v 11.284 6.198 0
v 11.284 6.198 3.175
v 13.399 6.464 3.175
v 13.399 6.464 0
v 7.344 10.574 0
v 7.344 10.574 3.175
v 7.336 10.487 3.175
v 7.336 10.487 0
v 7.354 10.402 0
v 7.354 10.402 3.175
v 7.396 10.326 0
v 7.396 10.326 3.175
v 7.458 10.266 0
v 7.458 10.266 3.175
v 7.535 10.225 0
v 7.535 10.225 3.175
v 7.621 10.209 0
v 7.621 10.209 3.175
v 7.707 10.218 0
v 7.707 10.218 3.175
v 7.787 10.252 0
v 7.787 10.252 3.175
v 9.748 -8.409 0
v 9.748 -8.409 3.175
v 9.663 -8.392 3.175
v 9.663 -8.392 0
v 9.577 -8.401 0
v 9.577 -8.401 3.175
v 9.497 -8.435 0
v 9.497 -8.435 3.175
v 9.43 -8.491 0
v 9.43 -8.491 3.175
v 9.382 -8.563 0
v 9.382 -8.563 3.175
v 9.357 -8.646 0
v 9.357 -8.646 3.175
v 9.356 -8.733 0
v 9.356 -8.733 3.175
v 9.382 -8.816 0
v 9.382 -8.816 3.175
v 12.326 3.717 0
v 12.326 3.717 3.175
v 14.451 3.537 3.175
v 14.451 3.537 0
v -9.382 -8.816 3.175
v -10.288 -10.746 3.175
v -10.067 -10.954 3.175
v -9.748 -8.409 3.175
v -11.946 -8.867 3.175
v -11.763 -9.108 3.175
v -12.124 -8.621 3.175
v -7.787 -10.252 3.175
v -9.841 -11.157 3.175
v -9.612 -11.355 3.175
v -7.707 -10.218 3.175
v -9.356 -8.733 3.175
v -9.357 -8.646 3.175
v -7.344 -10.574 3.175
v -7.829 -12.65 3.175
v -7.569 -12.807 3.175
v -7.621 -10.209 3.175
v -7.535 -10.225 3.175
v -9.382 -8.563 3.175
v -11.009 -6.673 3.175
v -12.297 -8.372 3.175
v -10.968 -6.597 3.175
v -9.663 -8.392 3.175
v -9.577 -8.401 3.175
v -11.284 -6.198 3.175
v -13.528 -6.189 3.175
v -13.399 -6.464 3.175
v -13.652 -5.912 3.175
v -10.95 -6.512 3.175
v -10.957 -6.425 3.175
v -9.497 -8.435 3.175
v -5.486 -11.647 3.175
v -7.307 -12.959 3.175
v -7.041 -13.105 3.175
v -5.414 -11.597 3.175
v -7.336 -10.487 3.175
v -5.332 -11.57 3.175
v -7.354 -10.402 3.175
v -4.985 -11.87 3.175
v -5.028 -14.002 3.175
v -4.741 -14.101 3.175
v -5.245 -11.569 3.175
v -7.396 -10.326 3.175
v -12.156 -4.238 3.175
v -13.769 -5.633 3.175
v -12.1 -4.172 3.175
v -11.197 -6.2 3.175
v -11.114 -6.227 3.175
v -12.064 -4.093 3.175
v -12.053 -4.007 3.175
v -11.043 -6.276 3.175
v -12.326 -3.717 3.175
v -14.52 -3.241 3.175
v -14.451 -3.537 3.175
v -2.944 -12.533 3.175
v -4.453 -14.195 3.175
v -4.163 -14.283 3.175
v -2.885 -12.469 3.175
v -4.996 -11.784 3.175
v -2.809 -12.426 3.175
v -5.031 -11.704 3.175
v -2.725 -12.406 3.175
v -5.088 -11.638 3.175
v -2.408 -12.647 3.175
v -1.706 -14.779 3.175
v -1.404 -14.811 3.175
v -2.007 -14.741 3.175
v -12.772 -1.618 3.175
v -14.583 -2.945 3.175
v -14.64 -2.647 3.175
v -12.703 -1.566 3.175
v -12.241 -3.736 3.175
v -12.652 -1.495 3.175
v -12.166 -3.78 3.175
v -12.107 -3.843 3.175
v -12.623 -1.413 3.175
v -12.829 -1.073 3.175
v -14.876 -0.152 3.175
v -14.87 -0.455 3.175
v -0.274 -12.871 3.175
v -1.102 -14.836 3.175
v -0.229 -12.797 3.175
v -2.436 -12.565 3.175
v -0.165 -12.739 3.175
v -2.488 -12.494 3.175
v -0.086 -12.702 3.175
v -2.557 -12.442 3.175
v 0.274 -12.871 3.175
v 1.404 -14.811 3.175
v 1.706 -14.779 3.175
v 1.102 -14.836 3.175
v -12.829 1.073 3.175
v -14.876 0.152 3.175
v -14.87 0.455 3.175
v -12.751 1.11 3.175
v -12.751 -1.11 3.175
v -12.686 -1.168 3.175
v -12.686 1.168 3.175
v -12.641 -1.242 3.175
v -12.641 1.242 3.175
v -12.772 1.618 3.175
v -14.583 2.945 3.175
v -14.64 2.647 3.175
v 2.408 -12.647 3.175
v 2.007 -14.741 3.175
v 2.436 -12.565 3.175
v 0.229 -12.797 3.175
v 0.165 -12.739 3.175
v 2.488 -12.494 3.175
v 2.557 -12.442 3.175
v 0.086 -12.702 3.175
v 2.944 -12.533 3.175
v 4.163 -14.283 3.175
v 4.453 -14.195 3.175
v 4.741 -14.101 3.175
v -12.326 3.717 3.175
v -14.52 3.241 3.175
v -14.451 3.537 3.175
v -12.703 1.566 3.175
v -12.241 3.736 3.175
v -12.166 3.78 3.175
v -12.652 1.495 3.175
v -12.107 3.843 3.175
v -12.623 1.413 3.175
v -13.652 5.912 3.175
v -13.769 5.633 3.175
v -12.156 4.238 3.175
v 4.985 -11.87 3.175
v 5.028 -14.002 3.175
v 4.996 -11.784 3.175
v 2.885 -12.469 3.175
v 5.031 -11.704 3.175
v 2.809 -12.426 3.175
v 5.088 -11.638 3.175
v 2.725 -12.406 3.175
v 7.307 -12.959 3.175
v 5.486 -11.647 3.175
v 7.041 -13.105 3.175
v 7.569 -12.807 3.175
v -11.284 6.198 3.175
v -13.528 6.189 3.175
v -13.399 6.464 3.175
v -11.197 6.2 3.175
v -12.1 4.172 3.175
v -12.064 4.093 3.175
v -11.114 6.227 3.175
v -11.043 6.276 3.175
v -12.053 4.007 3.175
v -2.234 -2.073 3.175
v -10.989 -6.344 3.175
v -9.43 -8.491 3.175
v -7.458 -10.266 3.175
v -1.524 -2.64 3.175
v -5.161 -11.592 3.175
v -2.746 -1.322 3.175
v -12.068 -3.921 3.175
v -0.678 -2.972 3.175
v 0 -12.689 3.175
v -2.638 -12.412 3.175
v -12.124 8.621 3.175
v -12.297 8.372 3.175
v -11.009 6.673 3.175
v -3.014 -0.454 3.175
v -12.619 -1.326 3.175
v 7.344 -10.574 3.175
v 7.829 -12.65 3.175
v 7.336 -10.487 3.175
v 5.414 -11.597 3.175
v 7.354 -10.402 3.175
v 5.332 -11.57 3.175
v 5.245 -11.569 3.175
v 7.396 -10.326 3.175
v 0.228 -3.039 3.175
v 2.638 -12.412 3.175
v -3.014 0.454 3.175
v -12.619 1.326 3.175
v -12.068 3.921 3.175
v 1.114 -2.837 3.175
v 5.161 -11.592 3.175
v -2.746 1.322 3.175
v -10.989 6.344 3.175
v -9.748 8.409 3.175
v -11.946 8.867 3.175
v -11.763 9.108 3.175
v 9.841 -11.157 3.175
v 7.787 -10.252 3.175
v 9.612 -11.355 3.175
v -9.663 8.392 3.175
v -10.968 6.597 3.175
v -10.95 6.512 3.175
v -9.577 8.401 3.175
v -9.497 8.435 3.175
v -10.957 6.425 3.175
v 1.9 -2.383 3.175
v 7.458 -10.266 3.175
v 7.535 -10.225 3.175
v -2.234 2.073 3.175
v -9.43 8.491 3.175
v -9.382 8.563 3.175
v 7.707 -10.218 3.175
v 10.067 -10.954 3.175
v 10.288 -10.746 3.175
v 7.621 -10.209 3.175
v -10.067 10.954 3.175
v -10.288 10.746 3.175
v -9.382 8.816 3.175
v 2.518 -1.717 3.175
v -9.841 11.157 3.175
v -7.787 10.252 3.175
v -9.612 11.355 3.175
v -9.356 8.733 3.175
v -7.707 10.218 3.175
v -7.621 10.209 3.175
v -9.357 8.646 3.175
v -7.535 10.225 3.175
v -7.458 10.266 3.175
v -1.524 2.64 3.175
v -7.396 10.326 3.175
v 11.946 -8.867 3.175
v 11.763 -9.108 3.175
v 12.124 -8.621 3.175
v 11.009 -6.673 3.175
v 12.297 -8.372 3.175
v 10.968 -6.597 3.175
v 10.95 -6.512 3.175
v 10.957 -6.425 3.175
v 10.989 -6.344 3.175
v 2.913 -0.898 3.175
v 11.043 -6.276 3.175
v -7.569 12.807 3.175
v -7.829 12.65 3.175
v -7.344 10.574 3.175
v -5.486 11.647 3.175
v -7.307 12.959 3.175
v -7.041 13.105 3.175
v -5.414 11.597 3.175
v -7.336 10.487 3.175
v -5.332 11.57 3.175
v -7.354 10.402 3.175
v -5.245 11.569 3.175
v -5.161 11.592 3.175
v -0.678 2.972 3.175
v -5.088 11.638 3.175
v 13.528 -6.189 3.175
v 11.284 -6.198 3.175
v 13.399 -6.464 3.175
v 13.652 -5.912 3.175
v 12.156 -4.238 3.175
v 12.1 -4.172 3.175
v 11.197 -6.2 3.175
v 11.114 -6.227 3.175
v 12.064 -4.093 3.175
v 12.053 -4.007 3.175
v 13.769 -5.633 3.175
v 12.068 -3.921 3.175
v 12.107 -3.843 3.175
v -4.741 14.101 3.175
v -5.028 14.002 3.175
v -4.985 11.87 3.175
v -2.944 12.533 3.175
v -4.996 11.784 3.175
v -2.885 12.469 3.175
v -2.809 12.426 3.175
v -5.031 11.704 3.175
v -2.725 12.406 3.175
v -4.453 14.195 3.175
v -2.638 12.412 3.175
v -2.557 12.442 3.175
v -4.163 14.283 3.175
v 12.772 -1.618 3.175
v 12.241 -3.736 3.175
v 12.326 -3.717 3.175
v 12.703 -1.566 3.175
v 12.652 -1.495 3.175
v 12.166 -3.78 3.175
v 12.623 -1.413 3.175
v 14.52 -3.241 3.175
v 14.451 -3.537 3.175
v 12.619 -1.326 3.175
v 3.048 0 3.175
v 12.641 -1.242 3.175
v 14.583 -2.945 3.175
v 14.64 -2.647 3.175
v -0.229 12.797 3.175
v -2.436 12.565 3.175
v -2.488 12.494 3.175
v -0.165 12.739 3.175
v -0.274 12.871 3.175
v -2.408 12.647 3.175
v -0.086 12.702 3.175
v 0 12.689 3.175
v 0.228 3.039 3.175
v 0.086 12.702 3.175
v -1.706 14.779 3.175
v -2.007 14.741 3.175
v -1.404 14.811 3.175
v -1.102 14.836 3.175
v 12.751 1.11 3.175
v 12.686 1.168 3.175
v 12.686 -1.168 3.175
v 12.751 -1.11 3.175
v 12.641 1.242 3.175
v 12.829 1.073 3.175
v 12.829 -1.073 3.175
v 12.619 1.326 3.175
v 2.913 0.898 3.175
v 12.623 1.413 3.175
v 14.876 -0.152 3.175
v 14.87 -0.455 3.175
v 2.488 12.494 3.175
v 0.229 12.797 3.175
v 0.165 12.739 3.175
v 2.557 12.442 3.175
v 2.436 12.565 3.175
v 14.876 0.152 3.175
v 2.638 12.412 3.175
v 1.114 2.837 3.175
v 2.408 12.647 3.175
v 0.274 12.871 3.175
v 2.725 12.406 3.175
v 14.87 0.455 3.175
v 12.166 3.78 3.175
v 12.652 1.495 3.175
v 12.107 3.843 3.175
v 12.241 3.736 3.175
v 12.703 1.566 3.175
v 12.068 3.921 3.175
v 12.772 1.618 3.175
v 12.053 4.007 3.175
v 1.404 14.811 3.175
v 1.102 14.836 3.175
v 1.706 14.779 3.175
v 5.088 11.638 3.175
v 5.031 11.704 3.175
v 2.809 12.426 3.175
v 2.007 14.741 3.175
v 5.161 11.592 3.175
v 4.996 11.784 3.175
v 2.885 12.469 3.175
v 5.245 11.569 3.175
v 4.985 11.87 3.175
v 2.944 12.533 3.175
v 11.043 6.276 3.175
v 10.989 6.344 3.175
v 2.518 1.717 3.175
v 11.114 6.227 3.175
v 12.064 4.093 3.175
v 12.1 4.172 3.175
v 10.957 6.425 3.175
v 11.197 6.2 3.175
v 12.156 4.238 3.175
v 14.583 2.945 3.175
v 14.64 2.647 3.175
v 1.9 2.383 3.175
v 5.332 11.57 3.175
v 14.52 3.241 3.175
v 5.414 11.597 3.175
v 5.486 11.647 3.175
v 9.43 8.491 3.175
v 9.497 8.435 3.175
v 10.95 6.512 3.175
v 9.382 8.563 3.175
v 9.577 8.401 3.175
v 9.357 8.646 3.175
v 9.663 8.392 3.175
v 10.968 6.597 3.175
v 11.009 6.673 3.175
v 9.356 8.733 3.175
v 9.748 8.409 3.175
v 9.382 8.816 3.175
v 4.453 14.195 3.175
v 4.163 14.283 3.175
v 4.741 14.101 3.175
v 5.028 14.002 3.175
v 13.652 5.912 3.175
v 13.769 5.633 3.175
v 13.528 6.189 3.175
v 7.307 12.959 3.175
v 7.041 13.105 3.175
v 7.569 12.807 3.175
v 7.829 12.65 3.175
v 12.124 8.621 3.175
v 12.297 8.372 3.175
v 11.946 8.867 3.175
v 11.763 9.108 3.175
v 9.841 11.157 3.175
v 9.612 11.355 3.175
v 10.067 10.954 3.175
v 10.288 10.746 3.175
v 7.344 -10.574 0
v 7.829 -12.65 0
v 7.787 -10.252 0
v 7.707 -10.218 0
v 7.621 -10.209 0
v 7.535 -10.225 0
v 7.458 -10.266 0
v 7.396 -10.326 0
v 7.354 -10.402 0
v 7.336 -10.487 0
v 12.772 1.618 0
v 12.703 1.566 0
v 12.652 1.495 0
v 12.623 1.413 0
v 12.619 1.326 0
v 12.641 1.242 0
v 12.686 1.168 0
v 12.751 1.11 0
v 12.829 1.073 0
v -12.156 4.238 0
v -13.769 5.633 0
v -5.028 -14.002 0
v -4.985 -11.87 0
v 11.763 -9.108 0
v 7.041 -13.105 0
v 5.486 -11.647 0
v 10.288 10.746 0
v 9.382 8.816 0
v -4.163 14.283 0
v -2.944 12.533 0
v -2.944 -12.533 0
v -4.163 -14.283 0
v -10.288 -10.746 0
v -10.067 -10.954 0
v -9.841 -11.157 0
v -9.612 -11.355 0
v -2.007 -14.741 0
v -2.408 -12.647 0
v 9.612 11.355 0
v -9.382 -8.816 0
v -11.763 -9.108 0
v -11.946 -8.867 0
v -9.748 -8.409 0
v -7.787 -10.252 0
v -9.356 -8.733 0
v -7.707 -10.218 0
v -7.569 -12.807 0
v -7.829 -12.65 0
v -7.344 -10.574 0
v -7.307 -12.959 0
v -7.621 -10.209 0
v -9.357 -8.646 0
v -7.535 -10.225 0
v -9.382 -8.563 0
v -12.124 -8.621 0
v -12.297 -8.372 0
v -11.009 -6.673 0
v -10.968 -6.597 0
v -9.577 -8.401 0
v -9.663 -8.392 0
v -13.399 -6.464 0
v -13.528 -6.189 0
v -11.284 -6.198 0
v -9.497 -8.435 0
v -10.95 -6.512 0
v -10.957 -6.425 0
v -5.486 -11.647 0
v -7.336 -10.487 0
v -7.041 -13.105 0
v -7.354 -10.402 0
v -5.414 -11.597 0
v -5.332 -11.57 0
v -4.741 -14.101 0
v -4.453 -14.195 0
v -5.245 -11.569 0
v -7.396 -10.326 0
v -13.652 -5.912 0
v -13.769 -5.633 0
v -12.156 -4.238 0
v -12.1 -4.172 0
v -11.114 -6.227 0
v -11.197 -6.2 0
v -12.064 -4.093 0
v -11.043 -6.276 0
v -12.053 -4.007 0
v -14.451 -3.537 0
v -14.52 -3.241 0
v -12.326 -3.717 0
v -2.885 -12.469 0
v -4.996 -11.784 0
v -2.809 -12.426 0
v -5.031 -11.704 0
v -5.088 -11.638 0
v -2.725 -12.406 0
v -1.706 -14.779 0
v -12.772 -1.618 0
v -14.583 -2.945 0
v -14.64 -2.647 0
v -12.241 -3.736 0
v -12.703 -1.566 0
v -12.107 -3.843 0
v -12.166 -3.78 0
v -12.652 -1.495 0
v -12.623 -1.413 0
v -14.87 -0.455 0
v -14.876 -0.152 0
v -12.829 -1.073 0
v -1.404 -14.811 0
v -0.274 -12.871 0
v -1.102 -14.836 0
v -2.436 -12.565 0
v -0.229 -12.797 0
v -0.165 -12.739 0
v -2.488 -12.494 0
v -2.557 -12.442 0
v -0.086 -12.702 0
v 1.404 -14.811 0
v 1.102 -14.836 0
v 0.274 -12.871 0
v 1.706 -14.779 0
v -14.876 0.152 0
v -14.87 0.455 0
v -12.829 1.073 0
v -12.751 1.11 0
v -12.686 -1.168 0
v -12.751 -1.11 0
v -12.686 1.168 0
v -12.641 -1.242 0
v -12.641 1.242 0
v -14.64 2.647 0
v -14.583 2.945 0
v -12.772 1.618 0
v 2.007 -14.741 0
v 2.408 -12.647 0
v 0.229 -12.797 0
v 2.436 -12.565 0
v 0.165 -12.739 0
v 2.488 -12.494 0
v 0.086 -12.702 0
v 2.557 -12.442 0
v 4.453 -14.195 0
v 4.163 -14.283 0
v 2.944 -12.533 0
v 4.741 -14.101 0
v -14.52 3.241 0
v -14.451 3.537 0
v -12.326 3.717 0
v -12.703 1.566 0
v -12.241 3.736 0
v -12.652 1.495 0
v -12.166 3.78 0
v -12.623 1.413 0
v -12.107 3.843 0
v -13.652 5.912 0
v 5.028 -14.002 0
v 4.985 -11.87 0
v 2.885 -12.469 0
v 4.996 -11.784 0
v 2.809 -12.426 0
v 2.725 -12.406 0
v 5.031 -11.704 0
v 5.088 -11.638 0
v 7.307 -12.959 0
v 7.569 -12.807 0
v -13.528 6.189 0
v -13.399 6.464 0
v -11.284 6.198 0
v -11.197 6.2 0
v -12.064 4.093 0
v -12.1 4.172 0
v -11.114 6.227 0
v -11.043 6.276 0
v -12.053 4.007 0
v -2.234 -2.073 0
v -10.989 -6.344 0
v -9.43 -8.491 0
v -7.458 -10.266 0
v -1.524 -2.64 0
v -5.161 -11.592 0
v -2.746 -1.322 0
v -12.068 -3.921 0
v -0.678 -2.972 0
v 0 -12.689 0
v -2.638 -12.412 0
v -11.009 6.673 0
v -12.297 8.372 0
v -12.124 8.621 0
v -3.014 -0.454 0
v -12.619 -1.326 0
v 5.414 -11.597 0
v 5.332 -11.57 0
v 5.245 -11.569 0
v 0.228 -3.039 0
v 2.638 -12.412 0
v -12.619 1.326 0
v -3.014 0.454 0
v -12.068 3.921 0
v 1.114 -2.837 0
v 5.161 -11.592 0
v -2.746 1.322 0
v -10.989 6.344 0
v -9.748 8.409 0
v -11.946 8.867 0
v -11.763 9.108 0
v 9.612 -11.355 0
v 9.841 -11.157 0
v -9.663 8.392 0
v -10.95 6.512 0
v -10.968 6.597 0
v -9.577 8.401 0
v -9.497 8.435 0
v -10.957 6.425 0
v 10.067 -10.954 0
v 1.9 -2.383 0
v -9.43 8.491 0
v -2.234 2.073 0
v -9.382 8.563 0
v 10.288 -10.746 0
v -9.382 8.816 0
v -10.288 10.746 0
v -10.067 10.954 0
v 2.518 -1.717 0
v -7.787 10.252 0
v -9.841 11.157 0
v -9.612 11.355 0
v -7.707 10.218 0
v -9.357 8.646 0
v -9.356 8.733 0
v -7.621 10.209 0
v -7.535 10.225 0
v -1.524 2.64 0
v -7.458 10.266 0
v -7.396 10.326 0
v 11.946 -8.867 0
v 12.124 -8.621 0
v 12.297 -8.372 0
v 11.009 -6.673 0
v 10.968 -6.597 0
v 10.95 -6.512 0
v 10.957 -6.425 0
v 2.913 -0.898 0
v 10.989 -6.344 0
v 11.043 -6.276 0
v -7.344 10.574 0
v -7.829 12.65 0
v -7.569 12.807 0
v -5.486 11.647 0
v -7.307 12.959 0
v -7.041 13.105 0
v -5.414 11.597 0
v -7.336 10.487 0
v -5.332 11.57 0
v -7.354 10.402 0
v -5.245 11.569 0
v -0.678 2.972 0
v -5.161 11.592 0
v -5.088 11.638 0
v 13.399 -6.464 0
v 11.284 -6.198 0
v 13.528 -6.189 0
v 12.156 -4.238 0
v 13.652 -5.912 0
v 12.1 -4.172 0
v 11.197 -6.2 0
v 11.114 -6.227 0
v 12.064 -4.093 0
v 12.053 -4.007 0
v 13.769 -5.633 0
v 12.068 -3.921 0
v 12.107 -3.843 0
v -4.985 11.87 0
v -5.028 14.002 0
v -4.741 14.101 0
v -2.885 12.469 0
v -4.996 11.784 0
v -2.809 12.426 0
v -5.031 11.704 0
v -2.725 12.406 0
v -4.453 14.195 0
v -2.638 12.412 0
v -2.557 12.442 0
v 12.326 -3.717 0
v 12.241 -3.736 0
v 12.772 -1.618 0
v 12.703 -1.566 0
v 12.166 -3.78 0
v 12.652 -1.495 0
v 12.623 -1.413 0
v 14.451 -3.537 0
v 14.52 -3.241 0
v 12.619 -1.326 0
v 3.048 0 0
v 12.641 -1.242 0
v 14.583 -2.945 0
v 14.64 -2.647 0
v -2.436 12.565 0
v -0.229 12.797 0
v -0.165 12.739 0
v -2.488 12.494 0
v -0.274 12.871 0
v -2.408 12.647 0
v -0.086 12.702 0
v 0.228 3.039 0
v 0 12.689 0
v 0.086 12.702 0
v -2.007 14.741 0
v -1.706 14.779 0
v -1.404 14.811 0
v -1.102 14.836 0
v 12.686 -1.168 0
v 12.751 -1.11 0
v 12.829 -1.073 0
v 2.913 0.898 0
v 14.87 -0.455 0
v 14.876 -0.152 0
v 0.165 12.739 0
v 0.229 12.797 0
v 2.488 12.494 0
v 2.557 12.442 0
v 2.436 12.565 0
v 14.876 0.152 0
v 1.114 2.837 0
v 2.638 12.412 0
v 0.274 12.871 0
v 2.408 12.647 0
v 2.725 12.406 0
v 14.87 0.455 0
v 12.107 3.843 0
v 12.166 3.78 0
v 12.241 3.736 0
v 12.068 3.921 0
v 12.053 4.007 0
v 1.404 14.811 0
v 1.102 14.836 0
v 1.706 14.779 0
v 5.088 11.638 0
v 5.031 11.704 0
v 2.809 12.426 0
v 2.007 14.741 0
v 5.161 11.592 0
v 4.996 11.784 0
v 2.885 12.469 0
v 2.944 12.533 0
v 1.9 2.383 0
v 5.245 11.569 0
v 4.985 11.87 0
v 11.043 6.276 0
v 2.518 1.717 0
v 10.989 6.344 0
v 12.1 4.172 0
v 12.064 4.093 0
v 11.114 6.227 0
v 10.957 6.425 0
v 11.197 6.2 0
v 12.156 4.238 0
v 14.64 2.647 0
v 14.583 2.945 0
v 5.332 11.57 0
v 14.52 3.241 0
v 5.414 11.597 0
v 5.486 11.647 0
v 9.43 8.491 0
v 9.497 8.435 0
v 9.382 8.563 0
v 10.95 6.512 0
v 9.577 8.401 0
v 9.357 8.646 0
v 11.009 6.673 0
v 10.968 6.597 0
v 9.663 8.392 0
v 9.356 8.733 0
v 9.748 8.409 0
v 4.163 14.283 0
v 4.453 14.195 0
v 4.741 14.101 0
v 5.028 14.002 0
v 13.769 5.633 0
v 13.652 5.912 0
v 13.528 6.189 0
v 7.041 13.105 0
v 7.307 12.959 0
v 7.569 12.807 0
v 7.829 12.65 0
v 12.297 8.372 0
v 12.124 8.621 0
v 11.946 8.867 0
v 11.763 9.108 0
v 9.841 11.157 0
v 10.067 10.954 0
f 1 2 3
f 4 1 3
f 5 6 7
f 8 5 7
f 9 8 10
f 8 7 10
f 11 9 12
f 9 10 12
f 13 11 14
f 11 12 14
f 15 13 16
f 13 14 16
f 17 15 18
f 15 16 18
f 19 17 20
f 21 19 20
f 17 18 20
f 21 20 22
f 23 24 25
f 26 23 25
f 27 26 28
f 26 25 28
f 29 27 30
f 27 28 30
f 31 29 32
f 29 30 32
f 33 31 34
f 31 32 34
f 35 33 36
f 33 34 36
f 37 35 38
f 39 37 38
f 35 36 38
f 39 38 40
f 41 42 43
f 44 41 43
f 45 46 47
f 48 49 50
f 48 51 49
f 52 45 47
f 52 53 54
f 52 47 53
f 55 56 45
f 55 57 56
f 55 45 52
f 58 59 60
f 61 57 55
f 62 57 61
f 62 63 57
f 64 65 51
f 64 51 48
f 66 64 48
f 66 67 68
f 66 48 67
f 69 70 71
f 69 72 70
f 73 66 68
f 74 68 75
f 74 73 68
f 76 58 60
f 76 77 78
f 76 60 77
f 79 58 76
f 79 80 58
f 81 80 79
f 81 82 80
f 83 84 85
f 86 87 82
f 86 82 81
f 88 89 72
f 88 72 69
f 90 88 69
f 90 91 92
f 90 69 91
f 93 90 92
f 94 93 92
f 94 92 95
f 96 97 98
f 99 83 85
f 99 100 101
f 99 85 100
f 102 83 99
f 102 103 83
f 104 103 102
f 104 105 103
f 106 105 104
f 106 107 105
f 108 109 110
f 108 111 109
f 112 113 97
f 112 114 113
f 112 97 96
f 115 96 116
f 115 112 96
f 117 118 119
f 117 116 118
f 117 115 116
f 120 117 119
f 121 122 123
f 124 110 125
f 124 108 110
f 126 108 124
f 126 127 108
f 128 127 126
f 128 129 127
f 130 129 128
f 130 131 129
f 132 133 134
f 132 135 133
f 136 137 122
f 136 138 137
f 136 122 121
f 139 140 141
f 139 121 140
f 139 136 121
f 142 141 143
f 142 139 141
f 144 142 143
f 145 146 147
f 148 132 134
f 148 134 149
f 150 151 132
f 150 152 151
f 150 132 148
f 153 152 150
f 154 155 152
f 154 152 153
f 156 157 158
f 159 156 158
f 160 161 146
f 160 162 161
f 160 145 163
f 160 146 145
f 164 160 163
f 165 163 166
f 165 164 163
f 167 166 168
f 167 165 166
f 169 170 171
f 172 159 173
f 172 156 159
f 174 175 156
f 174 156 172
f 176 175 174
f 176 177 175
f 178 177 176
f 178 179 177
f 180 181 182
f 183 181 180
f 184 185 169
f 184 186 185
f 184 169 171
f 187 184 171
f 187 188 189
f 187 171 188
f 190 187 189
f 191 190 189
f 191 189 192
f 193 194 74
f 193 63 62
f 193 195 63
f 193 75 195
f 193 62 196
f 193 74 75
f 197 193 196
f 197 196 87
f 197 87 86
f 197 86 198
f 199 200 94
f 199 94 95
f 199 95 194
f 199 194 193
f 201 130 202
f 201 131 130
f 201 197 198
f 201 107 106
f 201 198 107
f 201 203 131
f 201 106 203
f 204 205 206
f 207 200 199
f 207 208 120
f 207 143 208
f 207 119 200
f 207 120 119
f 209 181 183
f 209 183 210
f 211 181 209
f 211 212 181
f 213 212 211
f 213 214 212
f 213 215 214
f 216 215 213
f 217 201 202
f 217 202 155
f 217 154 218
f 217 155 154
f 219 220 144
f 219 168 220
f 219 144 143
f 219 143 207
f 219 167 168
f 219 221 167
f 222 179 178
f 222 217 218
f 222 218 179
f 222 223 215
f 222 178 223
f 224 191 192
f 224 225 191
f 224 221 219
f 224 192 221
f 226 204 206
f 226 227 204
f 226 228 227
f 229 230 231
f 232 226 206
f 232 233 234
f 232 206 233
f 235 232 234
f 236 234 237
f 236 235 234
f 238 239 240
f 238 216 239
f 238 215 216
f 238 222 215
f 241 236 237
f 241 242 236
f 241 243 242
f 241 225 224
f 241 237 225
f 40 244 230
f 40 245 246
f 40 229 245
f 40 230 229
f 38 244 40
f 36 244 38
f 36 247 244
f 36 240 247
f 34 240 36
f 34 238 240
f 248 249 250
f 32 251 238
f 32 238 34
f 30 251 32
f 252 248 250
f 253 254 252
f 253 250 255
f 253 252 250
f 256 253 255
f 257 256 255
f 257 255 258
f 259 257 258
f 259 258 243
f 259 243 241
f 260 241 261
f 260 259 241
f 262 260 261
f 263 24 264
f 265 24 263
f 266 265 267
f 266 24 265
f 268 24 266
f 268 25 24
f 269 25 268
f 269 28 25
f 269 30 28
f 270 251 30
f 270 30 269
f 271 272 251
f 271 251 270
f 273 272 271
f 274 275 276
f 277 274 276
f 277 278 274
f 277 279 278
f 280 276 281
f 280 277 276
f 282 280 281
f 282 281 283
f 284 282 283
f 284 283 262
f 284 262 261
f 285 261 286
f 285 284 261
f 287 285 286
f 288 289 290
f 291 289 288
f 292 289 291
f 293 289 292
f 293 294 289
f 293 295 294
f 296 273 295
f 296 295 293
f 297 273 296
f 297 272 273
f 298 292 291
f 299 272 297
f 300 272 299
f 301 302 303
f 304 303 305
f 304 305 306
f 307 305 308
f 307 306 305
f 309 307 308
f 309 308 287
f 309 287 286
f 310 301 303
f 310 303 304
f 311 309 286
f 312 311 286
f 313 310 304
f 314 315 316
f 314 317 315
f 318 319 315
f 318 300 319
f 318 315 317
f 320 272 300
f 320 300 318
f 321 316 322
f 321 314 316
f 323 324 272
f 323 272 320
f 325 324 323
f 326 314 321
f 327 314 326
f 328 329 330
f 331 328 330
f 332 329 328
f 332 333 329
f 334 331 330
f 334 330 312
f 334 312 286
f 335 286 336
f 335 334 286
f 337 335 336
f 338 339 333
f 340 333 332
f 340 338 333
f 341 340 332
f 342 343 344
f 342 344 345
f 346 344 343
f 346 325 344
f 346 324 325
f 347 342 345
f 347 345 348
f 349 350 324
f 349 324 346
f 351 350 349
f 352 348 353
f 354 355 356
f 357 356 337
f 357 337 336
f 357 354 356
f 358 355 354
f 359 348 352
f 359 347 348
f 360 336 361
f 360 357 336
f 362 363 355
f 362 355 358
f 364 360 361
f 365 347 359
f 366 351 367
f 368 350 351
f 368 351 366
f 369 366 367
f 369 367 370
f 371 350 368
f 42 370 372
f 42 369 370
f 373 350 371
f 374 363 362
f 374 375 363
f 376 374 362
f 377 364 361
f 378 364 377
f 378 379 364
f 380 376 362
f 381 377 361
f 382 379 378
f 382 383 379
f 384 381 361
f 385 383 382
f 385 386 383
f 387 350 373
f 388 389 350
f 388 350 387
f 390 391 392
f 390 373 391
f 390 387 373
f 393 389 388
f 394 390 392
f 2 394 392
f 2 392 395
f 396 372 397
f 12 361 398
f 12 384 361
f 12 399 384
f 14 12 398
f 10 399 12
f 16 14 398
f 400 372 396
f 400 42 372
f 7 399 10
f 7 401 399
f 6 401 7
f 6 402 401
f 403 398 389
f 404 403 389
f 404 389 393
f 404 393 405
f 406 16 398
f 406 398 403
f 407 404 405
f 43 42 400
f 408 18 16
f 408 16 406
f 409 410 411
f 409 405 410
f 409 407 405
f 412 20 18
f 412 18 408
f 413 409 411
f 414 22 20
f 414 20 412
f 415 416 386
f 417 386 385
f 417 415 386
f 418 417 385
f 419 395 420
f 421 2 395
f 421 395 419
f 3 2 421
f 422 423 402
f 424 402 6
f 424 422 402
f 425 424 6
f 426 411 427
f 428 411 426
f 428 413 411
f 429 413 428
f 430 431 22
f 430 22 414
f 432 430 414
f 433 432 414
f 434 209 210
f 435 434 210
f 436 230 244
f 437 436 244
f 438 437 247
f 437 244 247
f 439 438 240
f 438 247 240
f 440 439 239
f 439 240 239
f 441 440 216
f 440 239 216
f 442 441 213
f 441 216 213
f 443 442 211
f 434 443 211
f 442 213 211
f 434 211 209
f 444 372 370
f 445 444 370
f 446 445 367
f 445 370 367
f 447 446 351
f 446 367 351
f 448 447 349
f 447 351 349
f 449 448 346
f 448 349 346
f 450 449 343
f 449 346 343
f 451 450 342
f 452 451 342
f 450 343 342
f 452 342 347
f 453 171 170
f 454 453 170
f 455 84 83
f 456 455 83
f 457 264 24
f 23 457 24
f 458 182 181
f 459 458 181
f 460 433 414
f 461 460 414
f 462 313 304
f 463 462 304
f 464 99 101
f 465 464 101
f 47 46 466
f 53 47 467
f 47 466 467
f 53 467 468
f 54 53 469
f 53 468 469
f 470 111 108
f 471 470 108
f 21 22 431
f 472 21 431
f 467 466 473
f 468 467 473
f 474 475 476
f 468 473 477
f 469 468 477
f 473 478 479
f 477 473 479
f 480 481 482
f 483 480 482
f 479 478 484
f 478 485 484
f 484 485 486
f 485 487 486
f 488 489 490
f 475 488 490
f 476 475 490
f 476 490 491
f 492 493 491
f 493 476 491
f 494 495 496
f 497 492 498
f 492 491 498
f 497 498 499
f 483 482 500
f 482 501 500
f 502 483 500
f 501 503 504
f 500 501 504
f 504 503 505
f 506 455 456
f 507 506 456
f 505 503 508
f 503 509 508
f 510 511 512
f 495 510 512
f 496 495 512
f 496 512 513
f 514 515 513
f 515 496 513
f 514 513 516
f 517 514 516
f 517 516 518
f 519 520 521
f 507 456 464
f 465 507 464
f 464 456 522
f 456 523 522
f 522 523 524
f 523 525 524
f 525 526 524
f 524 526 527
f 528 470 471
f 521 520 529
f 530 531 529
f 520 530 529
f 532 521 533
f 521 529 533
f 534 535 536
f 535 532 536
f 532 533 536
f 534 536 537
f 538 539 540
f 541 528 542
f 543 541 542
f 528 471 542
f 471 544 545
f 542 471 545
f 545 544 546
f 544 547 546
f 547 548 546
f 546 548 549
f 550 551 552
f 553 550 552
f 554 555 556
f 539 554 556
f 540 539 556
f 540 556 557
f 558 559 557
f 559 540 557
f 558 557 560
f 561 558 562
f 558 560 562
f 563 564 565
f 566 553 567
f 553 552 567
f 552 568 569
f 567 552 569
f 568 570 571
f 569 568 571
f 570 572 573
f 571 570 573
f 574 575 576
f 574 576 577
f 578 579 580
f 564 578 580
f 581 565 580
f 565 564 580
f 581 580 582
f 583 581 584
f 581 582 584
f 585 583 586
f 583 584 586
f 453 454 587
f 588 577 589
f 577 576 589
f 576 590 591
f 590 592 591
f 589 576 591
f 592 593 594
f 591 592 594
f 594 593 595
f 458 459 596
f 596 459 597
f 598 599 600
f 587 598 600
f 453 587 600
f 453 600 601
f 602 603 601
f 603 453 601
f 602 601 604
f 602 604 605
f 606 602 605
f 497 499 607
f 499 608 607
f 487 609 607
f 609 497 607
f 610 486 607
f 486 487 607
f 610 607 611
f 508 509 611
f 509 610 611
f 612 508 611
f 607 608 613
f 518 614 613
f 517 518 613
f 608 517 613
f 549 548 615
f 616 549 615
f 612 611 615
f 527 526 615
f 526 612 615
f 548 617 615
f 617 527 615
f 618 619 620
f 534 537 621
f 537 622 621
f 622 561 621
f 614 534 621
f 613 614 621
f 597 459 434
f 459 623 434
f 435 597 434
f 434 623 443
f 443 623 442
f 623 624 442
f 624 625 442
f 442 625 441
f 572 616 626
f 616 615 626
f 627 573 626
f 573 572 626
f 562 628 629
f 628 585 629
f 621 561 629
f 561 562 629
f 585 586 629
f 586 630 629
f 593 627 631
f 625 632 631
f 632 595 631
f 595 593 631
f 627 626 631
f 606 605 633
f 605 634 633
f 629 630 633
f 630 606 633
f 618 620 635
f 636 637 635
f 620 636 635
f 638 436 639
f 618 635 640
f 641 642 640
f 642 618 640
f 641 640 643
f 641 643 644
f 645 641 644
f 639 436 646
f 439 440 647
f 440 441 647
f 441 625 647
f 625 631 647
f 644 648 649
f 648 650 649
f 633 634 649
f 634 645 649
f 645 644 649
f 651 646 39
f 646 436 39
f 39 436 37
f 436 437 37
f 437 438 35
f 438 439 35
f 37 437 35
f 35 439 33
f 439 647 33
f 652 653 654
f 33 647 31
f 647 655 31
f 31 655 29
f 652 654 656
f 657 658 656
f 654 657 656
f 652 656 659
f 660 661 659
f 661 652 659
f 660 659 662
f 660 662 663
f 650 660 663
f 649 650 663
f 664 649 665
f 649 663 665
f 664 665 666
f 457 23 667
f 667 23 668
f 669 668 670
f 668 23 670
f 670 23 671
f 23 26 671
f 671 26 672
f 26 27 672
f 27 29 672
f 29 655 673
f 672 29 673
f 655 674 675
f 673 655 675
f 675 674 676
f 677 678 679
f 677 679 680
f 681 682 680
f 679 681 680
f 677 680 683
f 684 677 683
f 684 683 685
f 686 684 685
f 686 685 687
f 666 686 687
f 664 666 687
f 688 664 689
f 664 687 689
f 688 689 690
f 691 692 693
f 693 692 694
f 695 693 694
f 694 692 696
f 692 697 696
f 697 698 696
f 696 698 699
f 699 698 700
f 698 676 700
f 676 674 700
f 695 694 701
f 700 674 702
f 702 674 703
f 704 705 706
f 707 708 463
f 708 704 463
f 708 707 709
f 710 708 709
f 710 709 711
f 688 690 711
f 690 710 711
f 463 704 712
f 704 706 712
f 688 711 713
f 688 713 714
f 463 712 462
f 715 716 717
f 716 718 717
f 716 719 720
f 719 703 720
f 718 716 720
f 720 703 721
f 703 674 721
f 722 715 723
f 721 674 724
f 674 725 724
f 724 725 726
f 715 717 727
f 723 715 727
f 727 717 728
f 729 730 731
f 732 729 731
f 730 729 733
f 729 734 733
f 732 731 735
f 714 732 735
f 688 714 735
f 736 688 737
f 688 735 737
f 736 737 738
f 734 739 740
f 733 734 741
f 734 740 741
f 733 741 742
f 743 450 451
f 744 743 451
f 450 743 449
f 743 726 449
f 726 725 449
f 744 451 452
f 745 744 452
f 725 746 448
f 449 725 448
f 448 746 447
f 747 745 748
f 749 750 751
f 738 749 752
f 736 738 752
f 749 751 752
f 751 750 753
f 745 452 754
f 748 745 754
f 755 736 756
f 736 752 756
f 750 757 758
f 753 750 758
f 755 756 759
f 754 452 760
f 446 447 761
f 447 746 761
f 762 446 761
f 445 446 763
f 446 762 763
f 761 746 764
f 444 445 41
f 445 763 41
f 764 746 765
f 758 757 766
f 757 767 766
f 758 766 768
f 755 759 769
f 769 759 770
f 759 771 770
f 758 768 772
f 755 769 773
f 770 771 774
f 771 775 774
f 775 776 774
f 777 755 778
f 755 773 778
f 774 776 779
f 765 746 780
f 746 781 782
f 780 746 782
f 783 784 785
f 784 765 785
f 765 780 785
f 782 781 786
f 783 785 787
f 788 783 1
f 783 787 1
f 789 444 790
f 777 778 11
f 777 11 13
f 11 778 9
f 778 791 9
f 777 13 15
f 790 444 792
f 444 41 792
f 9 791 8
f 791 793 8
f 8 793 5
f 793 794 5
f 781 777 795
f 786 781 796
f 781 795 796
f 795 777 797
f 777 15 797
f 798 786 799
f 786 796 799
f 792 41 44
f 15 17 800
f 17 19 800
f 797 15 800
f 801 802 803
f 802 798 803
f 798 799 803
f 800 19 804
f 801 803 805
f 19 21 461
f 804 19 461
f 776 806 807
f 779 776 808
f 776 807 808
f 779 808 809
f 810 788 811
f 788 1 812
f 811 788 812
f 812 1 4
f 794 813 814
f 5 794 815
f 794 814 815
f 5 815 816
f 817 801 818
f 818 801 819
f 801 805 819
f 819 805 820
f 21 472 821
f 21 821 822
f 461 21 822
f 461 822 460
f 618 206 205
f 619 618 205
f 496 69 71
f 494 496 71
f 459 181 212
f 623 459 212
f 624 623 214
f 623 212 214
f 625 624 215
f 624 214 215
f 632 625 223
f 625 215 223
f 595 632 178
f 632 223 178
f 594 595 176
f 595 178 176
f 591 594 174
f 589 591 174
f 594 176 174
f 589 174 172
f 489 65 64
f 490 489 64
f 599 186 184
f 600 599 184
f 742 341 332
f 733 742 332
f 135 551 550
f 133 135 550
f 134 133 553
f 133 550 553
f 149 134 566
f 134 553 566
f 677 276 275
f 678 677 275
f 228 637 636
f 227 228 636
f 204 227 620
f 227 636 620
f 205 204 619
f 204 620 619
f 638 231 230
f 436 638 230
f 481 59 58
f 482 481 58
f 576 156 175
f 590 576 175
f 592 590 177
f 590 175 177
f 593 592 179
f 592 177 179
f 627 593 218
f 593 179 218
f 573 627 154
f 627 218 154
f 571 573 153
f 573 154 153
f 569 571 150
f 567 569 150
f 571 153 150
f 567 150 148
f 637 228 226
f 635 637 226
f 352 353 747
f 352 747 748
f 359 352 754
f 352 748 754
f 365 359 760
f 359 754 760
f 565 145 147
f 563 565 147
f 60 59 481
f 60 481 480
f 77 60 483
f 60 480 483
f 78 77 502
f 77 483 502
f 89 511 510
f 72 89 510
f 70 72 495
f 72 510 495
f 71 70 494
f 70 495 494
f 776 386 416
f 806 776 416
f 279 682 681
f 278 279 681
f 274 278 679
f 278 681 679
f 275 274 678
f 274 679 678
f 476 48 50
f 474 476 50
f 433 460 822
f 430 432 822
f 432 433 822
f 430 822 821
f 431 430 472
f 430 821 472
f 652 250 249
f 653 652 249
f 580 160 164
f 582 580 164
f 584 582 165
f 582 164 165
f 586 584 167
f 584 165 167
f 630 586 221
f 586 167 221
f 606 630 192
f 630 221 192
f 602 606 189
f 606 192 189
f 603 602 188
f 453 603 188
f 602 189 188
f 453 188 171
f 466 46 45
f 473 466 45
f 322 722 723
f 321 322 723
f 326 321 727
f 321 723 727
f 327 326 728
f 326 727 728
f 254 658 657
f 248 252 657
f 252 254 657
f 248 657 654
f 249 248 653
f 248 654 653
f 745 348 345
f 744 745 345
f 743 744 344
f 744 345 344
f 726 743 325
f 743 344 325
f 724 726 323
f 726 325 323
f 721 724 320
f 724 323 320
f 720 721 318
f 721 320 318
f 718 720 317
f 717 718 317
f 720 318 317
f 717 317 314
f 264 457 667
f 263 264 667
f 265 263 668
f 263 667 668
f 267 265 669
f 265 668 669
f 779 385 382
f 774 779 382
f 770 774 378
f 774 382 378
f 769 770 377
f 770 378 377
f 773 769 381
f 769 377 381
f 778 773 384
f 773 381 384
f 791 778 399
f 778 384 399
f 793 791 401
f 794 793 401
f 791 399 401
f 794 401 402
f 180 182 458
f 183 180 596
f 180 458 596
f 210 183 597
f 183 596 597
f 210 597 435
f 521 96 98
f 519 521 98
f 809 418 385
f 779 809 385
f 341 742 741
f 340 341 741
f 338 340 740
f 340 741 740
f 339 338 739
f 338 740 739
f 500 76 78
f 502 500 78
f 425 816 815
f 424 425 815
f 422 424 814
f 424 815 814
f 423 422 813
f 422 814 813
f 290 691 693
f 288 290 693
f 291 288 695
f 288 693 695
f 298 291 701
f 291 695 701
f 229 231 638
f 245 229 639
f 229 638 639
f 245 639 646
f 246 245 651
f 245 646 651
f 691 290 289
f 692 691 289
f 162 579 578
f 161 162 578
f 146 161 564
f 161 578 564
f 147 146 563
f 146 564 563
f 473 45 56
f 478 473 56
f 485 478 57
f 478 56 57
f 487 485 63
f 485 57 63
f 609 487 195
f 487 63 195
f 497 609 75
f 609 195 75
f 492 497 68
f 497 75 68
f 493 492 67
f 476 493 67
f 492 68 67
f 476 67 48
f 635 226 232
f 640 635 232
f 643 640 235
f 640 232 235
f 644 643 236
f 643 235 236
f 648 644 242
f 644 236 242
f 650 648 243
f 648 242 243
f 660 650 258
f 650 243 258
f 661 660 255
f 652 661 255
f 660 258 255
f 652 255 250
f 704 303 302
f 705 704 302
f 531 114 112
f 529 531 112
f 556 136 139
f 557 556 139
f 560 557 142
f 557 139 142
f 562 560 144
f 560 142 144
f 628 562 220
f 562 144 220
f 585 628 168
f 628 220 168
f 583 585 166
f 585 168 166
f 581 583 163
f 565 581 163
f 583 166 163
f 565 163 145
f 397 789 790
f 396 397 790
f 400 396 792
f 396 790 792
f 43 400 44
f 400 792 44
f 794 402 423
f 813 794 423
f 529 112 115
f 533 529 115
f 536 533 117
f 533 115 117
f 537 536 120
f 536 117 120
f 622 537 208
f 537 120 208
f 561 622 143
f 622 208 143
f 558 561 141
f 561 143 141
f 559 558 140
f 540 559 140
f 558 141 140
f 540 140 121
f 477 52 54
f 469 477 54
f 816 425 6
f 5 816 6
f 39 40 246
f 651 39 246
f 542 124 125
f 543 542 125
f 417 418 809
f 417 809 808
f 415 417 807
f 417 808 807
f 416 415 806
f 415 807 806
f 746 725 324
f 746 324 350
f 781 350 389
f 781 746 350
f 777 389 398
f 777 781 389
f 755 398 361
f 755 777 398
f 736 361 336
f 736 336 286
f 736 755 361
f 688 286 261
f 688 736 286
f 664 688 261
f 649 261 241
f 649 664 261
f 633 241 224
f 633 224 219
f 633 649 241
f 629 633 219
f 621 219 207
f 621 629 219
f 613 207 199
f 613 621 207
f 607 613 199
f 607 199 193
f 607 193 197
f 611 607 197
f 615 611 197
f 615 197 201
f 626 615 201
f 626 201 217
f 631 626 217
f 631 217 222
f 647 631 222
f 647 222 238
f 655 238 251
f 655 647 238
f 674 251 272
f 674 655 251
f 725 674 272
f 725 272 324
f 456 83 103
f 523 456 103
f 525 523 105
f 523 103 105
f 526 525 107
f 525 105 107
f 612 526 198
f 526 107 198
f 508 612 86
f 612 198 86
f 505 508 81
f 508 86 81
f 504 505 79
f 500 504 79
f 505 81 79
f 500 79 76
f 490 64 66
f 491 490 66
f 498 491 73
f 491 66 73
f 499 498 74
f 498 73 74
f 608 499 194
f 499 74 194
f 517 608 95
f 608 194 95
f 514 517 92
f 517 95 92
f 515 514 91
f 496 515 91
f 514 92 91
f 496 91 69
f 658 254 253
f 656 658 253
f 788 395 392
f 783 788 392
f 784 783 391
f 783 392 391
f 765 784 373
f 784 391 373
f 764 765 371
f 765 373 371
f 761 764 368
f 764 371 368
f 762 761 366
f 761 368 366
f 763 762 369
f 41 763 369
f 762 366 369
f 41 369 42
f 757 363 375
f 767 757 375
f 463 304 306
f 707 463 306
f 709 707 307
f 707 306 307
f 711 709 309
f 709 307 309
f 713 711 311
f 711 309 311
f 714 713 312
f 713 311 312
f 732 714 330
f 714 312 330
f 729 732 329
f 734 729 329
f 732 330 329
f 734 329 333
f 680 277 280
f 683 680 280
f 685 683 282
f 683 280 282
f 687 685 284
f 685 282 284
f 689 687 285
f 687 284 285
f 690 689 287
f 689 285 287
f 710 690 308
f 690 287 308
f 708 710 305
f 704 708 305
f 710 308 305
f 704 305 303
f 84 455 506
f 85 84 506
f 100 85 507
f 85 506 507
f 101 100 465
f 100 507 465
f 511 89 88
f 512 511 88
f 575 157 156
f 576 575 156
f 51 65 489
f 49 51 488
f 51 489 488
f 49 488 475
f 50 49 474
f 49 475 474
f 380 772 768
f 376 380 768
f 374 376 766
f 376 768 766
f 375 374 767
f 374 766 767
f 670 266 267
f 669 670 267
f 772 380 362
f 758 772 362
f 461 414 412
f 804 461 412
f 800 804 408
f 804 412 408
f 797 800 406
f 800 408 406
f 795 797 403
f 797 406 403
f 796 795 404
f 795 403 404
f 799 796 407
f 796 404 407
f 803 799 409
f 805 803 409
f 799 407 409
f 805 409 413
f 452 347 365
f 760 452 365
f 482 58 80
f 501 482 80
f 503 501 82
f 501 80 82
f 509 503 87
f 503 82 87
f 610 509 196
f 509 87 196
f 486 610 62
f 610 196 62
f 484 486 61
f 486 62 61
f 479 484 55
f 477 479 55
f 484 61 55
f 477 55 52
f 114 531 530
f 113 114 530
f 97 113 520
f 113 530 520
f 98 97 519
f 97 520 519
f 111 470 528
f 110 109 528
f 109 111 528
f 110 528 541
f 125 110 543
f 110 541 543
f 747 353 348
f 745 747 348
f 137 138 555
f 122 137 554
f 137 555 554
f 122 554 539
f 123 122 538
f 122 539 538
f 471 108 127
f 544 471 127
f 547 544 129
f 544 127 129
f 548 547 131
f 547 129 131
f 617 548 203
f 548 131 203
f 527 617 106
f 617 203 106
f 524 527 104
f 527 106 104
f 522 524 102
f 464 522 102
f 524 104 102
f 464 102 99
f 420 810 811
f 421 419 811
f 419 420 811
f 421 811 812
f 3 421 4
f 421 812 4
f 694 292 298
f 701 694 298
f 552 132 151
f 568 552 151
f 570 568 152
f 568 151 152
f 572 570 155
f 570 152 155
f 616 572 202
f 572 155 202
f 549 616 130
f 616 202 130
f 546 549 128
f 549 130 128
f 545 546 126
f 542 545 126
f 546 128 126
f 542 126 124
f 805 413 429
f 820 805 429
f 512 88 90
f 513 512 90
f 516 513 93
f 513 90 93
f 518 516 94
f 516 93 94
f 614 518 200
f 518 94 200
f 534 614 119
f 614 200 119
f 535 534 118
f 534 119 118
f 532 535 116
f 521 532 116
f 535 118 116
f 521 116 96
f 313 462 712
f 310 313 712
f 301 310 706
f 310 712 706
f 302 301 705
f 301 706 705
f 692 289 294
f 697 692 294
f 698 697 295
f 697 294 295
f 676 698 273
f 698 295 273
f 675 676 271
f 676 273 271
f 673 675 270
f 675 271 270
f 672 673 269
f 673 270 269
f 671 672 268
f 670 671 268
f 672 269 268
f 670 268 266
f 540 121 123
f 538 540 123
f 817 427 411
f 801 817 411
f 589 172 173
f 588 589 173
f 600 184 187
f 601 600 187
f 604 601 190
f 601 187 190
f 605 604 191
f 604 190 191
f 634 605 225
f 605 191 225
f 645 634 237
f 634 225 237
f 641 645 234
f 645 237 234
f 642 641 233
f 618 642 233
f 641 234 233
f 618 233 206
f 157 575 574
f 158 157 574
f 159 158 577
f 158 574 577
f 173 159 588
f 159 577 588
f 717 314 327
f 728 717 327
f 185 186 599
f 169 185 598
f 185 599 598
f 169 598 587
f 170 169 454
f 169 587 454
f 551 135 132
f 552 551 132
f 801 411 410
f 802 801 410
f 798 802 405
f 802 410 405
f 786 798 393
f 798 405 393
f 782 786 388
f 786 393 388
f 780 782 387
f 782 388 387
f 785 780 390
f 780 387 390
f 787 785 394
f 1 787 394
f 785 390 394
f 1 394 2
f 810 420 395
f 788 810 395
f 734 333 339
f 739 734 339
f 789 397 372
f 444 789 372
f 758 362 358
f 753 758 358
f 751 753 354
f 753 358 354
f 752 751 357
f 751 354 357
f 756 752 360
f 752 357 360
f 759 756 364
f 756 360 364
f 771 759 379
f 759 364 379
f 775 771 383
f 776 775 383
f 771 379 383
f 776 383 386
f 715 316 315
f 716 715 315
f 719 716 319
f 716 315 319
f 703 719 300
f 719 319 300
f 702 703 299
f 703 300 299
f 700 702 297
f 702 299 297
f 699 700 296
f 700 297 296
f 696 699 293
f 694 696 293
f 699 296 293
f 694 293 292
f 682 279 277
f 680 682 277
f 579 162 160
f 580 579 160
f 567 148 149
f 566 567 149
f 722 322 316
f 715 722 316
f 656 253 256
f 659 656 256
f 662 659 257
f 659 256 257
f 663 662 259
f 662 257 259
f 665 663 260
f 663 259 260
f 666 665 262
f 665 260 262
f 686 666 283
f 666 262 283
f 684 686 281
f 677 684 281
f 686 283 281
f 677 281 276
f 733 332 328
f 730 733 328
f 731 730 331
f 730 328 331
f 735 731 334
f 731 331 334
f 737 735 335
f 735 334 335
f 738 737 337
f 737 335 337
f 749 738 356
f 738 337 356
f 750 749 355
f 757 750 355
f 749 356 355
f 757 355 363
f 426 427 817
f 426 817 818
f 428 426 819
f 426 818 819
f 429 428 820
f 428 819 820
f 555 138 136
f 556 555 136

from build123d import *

# Parameters (mm, degrees)
F0_R            = 14.8770011714
F0_R_2          = 3.048
F1_DEPTH        = 3.175
F3_DEPTH        = 3.175
F3_COPIES_COUNT = 30


# Not quite as in the source:
# - a pattern or mirror of a feature is missing from the dataset's text; its kind, count and spacing are read off the source's solid


with BuildPart() as f1:
    # F0 (on Top) → F1 (new body)
    with BuildSketch(Plane.XY):
        Circle(F0_R)
        Circle(F0_R_2, mode=Mode.SUBTRACT)
    extrude(amount=F1_DEPTH)

    # F2 (on face) → F3 (cut, through all)
    with BuildSketch(Plane.XY.offset(3.175)):
        with BuildLine():
            Line((0.2742033495, 12.8709727929), (1.1020387684, 14.8361273386))
            ThreePointArc((1.1020387684, 14.8361273386), (0, 14.8770011714), (-1.1020387684, 14.8361273386))
            Line((-1.1020387684, 14.8361273386), (-0.2742033495, 12.8709727929))
            ThreePointArc((-0.2742033495, 12.8709727929), (0, 12.6889428931), (0.2742033495, 12.8709727929))
        make_face()
    f3 = extrude(amount=-F3_DEPTH, mode=Mode.SUBTRACT)

    # F3_copies: F3 ×30 about axis
    f3_copies_axis = Axis((0, 0, 0), (0, 0, 1))
    for i in range(1, F3_COPIES_COUNT):
        add(f3.rotate(f3_copies_axis, i * 360 / F3_COPIES_COUNT), mode=Mode.SUBTRACT)


solid = f1.part
